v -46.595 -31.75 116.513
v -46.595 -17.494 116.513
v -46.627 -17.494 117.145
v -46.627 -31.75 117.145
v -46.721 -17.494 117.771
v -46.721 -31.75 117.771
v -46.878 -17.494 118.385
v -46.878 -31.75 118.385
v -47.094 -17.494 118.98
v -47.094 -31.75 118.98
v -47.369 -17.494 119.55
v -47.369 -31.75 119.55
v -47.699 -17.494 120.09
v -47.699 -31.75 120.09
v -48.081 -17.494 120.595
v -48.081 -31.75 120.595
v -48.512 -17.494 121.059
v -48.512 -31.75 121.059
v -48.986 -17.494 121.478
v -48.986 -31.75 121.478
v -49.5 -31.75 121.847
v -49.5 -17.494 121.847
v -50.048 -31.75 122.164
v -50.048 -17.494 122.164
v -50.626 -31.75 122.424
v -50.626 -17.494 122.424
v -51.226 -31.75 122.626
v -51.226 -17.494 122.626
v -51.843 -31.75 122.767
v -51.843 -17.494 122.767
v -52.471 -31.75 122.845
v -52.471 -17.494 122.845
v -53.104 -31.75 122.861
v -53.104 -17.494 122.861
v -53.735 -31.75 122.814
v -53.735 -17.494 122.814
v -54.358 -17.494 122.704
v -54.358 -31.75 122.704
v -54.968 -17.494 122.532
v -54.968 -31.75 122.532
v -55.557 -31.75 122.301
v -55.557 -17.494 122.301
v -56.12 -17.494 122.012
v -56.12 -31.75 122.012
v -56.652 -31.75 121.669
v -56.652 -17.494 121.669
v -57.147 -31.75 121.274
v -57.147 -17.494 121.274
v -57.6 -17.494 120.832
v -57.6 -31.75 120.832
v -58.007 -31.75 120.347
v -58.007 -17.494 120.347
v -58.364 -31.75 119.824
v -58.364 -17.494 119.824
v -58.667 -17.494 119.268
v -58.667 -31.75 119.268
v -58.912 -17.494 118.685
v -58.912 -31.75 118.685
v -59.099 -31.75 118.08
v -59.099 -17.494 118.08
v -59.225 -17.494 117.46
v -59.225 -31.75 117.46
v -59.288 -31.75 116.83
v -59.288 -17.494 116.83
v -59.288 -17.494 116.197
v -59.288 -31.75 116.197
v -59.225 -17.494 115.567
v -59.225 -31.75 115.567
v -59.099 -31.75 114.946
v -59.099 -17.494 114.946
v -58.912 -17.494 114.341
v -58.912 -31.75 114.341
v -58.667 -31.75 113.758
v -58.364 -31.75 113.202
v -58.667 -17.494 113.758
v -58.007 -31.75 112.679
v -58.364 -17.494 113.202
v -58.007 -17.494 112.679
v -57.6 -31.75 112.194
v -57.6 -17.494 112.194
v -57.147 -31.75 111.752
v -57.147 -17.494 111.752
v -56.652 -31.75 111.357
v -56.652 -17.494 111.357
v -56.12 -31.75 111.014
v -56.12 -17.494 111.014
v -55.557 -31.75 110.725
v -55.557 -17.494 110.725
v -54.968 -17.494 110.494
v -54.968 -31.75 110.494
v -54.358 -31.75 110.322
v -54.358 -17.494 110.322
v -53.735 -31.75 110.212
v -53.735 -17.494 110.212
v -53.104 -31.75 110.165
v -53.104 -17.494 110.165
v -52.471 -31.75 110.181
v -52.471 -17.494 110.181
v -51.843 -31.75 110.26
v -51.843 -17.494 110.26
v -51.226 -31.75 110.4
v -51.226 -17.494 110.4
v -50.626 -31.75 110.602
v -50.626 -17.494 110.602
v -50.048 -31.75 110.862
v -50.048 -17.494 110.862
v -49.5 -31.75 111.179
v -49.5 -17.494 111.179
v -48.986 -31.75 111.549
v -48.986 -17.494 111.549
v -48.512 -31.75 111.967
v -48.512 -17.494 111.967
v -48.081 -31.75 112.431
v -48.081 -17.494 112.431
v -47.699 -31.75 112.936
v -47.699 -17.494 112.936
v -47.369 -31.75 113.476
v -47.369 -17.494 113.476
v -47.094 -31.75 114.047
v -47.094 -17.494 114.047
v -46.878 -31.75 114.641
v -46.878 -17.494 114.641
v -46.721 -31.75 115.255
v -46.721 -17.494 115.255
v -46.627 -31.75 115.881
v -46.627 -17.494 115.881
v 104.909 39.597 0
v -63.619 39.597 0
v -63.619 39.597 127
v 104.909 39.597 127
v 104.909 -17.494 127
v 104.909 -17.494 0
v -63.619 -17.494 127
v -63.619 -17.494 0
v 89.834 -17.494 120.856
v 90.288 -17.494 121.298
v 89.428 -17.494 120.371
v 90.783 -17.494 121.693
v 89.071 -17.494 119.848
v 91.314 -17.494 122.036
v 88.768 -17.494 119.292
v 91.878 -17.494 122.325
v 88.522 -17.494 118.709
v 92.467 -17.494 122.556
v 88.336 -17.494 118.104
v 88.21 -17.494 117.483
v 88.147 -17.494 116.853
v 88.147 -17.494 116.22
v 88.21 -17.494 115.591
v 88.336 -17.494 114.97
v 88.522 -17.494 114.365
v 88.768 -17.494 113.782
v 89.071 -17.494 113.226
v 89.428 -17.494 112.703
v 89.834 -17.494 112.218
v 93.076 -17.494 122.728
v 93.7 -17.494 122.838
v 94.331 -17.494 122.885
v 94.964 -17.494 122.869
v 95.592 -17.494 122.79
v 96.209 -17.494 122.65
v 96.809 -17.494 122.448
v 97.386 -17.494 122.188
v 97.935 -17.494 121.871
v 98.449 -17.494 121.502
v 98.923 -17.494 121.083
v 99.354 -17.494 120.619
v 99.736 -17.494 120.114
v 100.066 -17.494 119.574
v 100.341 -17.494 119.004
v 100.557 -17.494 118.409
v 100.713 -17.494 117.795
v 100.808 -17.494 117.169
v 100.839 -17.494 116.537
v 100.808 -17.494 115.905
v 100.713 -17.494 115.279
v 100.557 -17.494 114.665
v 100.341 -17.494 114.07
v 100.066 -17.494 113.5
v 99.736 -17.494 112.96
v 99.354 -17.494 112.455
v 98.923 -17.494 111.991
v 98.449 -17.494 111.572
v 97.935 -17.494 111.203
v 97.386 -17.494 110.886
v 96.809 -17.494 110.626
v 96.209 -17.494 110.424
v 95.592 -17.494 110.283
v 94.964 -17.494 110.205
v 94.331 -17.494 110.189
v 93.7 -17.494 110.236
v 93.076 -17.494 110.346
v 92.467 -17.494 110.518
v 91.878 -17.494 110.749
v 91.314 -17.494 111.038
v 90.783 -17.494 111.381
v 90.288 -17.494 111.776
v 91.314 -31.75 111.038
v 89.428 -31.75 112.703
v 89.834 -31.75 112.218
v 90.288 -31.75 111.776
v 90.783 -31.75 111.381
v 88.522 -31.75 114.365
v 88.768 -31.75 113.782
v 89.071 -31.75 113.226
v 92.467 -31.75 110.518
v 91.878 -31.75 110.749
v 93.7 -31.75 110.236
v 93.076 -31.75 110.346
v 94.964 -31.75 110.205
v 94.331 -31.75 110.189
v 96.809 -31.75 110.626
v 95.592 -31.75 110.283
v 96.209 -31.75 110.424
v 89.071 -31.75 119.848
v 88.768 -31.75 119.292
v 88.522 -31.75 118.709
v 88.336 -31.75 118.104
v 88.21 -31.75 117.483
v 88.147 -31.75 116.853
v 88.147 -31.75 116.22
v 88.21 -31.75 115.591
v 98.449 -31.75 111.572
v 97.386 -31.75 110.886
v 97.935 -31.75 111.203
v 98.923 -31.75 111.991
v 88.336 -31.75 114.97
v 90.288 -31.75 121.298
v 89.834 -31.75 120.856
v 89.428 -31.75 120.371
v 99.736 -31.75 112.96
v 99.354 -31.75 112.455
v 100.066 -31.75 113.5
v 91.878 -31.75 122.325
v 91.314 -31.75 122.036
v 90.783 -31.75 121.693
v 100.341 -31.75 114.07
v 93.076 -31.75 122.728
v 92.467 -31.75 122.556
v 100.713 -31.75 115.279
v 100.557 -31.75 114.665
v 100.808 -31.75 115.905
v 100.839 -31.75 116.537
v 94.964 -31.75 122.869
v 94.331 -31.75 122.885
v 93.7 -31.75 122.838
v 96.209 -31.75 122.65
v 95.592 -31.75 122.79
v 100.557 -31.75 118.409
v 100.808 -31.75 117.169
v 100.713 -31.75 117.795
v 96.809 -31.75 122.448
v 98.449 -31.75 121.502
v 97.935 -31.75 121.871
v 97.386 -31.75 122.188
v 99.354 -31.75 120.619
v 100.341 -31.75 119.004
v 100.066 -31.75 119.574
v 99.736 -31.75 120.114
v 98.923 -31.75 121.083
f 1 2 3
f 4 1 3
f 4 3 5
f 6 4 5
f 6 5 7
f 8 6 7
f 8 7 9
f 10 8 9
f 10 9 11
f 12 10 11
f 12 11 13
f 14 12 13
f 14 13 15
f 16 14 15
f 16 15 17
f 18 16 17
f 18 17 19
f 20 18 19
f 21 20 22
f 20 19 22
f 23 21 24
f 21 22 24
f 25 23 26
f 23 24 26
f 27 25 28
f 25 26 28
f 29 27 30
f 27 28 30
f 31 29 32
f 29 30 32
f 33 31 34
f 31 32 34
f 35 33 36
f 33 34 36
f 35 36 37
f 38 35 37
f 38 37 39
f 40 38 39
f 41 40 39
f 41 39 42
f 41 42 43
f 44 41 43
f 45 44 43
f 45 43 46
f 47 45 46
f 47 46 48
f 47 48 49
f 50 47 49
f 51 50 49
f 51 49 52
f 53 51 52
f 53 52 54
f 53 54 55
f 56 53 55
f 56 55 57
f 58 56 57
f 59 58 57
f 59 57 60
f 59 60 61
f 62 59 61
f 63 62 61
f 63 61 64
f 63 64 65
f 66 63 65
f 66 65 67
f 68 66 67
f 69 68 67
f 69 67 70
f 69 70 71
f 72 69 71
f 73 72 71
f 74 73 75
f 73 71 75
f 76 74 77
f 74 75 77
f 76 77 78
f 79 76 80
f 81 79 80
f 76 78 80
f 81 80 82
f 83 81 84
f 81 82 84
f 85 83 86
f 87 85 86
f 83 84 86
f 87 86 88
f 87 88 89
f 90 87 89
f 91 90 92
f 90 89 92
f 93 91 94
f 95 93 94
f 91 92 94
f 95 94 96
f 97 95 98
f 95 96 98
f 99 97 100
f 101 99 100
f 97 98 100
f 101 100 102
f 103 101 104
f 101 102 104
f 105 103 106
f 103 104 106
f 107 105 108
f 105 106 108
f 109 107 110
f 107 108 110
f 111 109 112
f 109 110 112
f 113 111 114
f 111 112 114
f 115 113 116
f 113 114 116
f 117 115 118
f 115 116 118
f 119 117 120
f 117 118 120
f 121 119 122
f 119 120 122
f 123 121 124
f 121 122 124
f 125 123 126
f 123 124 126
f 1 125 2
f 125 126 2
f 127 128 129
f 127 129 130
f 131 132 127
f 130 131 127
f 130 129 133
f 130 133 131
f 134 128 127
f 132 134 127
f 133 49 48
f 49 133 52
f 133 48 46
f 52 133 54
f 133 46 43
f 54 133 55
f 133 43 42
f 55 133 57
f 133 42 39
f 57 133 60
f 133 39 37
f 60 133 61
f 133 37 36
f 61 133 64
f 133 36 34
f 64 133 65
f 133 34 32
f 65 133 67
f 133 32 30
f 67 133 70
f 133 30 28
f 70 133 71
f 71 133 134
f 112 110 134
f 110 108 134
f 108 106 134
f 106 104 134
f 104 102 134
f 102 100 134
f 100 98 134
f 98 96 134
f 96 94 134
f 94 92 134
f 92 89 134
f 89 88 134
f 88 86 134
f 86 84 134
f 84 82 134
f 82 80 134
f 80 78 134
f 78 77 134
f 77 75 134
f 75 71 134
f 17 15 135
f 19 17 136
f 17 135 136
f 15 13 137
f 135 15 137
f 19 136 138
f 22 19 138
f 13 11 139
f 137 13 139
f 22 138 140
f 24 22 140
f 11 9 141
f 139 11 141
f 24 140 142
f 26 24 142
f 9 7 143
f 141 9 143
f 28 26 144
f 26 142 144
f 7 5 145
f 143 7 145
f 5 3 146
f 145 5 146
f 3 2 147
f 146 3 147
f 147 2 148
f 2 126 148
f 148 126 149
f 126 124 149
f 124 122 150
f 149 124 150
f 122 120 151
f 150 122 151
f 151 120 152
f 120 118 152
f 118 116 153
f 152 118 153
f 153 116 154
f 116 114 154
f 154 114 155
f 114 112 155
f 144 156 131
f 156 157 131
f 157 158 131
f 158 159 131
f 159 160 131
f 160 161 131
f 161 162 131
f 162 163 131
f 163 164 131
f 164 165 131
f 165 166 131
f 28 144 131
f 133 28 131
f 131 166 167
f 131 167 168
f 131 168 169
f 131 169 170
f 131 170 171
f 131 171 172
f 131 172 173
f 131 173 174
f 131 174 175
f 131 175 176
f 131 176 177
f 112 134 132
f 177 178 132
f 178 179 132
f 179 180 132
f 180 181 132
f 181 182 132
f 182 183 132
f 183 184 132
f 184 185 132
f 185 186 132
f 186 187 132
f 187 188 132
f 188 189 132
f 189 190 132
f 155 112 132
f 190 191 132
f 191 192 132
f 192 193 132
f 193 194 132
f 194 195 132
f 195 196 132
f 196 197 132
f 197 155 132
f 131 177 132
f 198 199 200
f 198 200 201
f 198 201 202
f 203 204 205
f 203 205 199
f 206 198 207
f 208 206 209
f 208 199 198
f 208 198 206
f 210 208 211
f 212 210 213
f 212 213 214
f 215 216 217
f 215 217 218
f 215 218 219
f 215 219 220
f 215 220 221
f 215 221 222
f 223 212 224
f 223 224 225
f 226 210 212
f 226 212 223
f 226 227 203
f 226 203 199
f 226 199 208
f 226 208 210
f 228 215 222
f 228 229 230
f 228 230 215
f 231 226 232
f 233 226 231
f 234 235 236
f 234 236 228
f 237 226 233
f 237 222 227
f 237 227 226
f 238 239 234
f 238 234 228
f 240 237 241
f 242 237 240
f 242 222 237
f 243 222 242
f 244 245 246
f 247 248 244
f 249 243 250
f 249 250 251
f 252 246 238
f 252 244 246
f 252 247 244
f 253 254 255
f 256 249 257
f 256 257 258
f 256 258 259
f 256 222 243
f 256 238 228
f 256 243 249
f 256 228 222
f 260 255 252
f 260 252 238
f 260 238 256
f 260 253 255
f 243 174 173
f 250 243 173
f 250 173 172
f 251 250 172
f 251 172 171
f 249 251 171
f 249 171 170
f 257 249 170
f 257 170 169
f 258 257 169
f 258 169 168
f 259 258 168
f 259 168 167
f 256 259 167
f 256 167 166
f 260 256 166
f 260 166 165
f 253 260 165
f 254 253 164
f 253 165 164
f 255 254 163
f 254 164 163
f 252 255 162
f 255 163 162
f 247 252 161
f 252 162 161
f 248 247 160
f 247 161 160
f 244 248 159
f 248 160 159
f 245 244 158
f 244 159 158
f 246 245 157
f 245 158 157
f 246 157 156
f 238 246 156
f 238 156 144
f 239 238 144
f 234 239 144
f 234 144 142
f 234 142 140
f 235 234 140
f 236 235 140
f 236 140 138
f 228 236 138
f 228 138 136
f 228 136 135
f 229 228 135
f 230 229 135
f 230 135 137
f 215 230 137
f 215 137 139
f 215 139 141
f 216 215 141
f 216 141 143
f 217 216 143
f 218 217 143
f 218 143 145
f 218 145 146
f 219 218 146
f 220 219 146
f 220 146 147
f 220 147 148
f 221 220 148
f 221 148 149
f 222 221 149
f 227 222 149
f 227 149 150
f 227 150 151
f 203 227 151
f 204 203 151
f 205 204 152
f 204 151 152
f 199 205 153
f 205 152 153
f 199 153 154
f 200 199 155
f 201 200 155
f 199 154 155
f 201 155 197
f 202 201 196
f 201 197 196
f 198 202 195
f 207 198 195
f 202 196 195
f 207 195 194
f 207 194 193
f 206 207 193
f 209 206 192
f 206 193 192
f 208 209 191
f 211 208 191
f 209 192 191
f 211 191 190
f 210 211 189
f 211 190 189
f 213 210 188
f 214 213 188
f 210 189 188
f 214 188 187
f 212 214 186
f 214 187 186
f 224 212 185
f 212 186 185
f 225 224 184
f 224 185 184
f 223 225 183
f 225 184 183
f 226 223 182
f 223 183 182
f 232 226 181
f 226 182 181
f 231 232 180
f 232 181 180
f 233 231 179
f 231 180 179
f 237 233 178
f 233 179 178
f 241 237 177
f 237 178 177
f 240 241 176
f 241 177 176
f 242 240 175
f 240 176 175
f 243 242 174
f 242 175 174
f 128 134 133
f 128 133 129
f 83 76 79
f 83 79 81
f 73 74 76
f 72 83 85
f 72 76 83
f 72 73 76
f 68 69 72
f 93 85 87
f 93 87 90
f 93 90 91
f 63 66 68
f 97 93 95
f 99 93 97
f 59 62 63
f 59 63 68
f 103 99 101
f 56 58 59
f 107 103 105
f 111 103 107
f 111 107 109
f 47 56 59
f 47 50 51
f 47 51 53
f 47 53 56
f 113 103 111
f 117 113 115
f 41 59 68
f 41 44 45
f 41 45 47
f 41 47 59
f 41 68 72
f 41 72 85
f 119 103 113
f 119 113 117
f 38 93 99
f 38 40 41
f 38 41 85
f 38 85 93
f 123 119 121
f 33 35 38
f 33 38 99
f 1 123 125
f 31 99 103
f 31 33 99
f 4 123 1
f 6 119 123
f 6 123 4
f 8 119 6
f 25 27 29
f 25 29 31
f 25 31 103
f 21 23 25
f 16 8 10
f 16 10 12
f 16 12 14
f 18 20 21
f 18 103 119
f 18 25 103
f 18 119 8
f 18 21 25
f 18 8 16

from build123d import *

# Parameters (mm, degrees)
F0_W     = 168.5284674168
F0_H     = 57.090960443
F1_DEPTH = 127
F2_R     = 6.35
F4_DEPTH = 31.75


# Not quite as in the source:
# - the program builds the solid bodies; features that only make, move or delete a surface that nothing else refers to are left out


with BuildPart() as f1:
    # F0 (on Top) → F1 (new body)
    with BuildSketch(Plane.XY):
        with Locations((20.6451192498, 11.0519304872)):
            Rectangle(F0_W, F0_H)
    extrude(amount=F1_DEPTH)

    # F2 (on Front) → F4 (join)
    with BuildSketch(Plane.XZ):
        with Locations((-52.945434434, 116.5131386886)):
            Circle(F2_R)
        with Locations((94.4893505254, 116.5369517954)):
            Circle(F2_R)
    extrude(amount=F4_DEPTH)


solid = f1.part
